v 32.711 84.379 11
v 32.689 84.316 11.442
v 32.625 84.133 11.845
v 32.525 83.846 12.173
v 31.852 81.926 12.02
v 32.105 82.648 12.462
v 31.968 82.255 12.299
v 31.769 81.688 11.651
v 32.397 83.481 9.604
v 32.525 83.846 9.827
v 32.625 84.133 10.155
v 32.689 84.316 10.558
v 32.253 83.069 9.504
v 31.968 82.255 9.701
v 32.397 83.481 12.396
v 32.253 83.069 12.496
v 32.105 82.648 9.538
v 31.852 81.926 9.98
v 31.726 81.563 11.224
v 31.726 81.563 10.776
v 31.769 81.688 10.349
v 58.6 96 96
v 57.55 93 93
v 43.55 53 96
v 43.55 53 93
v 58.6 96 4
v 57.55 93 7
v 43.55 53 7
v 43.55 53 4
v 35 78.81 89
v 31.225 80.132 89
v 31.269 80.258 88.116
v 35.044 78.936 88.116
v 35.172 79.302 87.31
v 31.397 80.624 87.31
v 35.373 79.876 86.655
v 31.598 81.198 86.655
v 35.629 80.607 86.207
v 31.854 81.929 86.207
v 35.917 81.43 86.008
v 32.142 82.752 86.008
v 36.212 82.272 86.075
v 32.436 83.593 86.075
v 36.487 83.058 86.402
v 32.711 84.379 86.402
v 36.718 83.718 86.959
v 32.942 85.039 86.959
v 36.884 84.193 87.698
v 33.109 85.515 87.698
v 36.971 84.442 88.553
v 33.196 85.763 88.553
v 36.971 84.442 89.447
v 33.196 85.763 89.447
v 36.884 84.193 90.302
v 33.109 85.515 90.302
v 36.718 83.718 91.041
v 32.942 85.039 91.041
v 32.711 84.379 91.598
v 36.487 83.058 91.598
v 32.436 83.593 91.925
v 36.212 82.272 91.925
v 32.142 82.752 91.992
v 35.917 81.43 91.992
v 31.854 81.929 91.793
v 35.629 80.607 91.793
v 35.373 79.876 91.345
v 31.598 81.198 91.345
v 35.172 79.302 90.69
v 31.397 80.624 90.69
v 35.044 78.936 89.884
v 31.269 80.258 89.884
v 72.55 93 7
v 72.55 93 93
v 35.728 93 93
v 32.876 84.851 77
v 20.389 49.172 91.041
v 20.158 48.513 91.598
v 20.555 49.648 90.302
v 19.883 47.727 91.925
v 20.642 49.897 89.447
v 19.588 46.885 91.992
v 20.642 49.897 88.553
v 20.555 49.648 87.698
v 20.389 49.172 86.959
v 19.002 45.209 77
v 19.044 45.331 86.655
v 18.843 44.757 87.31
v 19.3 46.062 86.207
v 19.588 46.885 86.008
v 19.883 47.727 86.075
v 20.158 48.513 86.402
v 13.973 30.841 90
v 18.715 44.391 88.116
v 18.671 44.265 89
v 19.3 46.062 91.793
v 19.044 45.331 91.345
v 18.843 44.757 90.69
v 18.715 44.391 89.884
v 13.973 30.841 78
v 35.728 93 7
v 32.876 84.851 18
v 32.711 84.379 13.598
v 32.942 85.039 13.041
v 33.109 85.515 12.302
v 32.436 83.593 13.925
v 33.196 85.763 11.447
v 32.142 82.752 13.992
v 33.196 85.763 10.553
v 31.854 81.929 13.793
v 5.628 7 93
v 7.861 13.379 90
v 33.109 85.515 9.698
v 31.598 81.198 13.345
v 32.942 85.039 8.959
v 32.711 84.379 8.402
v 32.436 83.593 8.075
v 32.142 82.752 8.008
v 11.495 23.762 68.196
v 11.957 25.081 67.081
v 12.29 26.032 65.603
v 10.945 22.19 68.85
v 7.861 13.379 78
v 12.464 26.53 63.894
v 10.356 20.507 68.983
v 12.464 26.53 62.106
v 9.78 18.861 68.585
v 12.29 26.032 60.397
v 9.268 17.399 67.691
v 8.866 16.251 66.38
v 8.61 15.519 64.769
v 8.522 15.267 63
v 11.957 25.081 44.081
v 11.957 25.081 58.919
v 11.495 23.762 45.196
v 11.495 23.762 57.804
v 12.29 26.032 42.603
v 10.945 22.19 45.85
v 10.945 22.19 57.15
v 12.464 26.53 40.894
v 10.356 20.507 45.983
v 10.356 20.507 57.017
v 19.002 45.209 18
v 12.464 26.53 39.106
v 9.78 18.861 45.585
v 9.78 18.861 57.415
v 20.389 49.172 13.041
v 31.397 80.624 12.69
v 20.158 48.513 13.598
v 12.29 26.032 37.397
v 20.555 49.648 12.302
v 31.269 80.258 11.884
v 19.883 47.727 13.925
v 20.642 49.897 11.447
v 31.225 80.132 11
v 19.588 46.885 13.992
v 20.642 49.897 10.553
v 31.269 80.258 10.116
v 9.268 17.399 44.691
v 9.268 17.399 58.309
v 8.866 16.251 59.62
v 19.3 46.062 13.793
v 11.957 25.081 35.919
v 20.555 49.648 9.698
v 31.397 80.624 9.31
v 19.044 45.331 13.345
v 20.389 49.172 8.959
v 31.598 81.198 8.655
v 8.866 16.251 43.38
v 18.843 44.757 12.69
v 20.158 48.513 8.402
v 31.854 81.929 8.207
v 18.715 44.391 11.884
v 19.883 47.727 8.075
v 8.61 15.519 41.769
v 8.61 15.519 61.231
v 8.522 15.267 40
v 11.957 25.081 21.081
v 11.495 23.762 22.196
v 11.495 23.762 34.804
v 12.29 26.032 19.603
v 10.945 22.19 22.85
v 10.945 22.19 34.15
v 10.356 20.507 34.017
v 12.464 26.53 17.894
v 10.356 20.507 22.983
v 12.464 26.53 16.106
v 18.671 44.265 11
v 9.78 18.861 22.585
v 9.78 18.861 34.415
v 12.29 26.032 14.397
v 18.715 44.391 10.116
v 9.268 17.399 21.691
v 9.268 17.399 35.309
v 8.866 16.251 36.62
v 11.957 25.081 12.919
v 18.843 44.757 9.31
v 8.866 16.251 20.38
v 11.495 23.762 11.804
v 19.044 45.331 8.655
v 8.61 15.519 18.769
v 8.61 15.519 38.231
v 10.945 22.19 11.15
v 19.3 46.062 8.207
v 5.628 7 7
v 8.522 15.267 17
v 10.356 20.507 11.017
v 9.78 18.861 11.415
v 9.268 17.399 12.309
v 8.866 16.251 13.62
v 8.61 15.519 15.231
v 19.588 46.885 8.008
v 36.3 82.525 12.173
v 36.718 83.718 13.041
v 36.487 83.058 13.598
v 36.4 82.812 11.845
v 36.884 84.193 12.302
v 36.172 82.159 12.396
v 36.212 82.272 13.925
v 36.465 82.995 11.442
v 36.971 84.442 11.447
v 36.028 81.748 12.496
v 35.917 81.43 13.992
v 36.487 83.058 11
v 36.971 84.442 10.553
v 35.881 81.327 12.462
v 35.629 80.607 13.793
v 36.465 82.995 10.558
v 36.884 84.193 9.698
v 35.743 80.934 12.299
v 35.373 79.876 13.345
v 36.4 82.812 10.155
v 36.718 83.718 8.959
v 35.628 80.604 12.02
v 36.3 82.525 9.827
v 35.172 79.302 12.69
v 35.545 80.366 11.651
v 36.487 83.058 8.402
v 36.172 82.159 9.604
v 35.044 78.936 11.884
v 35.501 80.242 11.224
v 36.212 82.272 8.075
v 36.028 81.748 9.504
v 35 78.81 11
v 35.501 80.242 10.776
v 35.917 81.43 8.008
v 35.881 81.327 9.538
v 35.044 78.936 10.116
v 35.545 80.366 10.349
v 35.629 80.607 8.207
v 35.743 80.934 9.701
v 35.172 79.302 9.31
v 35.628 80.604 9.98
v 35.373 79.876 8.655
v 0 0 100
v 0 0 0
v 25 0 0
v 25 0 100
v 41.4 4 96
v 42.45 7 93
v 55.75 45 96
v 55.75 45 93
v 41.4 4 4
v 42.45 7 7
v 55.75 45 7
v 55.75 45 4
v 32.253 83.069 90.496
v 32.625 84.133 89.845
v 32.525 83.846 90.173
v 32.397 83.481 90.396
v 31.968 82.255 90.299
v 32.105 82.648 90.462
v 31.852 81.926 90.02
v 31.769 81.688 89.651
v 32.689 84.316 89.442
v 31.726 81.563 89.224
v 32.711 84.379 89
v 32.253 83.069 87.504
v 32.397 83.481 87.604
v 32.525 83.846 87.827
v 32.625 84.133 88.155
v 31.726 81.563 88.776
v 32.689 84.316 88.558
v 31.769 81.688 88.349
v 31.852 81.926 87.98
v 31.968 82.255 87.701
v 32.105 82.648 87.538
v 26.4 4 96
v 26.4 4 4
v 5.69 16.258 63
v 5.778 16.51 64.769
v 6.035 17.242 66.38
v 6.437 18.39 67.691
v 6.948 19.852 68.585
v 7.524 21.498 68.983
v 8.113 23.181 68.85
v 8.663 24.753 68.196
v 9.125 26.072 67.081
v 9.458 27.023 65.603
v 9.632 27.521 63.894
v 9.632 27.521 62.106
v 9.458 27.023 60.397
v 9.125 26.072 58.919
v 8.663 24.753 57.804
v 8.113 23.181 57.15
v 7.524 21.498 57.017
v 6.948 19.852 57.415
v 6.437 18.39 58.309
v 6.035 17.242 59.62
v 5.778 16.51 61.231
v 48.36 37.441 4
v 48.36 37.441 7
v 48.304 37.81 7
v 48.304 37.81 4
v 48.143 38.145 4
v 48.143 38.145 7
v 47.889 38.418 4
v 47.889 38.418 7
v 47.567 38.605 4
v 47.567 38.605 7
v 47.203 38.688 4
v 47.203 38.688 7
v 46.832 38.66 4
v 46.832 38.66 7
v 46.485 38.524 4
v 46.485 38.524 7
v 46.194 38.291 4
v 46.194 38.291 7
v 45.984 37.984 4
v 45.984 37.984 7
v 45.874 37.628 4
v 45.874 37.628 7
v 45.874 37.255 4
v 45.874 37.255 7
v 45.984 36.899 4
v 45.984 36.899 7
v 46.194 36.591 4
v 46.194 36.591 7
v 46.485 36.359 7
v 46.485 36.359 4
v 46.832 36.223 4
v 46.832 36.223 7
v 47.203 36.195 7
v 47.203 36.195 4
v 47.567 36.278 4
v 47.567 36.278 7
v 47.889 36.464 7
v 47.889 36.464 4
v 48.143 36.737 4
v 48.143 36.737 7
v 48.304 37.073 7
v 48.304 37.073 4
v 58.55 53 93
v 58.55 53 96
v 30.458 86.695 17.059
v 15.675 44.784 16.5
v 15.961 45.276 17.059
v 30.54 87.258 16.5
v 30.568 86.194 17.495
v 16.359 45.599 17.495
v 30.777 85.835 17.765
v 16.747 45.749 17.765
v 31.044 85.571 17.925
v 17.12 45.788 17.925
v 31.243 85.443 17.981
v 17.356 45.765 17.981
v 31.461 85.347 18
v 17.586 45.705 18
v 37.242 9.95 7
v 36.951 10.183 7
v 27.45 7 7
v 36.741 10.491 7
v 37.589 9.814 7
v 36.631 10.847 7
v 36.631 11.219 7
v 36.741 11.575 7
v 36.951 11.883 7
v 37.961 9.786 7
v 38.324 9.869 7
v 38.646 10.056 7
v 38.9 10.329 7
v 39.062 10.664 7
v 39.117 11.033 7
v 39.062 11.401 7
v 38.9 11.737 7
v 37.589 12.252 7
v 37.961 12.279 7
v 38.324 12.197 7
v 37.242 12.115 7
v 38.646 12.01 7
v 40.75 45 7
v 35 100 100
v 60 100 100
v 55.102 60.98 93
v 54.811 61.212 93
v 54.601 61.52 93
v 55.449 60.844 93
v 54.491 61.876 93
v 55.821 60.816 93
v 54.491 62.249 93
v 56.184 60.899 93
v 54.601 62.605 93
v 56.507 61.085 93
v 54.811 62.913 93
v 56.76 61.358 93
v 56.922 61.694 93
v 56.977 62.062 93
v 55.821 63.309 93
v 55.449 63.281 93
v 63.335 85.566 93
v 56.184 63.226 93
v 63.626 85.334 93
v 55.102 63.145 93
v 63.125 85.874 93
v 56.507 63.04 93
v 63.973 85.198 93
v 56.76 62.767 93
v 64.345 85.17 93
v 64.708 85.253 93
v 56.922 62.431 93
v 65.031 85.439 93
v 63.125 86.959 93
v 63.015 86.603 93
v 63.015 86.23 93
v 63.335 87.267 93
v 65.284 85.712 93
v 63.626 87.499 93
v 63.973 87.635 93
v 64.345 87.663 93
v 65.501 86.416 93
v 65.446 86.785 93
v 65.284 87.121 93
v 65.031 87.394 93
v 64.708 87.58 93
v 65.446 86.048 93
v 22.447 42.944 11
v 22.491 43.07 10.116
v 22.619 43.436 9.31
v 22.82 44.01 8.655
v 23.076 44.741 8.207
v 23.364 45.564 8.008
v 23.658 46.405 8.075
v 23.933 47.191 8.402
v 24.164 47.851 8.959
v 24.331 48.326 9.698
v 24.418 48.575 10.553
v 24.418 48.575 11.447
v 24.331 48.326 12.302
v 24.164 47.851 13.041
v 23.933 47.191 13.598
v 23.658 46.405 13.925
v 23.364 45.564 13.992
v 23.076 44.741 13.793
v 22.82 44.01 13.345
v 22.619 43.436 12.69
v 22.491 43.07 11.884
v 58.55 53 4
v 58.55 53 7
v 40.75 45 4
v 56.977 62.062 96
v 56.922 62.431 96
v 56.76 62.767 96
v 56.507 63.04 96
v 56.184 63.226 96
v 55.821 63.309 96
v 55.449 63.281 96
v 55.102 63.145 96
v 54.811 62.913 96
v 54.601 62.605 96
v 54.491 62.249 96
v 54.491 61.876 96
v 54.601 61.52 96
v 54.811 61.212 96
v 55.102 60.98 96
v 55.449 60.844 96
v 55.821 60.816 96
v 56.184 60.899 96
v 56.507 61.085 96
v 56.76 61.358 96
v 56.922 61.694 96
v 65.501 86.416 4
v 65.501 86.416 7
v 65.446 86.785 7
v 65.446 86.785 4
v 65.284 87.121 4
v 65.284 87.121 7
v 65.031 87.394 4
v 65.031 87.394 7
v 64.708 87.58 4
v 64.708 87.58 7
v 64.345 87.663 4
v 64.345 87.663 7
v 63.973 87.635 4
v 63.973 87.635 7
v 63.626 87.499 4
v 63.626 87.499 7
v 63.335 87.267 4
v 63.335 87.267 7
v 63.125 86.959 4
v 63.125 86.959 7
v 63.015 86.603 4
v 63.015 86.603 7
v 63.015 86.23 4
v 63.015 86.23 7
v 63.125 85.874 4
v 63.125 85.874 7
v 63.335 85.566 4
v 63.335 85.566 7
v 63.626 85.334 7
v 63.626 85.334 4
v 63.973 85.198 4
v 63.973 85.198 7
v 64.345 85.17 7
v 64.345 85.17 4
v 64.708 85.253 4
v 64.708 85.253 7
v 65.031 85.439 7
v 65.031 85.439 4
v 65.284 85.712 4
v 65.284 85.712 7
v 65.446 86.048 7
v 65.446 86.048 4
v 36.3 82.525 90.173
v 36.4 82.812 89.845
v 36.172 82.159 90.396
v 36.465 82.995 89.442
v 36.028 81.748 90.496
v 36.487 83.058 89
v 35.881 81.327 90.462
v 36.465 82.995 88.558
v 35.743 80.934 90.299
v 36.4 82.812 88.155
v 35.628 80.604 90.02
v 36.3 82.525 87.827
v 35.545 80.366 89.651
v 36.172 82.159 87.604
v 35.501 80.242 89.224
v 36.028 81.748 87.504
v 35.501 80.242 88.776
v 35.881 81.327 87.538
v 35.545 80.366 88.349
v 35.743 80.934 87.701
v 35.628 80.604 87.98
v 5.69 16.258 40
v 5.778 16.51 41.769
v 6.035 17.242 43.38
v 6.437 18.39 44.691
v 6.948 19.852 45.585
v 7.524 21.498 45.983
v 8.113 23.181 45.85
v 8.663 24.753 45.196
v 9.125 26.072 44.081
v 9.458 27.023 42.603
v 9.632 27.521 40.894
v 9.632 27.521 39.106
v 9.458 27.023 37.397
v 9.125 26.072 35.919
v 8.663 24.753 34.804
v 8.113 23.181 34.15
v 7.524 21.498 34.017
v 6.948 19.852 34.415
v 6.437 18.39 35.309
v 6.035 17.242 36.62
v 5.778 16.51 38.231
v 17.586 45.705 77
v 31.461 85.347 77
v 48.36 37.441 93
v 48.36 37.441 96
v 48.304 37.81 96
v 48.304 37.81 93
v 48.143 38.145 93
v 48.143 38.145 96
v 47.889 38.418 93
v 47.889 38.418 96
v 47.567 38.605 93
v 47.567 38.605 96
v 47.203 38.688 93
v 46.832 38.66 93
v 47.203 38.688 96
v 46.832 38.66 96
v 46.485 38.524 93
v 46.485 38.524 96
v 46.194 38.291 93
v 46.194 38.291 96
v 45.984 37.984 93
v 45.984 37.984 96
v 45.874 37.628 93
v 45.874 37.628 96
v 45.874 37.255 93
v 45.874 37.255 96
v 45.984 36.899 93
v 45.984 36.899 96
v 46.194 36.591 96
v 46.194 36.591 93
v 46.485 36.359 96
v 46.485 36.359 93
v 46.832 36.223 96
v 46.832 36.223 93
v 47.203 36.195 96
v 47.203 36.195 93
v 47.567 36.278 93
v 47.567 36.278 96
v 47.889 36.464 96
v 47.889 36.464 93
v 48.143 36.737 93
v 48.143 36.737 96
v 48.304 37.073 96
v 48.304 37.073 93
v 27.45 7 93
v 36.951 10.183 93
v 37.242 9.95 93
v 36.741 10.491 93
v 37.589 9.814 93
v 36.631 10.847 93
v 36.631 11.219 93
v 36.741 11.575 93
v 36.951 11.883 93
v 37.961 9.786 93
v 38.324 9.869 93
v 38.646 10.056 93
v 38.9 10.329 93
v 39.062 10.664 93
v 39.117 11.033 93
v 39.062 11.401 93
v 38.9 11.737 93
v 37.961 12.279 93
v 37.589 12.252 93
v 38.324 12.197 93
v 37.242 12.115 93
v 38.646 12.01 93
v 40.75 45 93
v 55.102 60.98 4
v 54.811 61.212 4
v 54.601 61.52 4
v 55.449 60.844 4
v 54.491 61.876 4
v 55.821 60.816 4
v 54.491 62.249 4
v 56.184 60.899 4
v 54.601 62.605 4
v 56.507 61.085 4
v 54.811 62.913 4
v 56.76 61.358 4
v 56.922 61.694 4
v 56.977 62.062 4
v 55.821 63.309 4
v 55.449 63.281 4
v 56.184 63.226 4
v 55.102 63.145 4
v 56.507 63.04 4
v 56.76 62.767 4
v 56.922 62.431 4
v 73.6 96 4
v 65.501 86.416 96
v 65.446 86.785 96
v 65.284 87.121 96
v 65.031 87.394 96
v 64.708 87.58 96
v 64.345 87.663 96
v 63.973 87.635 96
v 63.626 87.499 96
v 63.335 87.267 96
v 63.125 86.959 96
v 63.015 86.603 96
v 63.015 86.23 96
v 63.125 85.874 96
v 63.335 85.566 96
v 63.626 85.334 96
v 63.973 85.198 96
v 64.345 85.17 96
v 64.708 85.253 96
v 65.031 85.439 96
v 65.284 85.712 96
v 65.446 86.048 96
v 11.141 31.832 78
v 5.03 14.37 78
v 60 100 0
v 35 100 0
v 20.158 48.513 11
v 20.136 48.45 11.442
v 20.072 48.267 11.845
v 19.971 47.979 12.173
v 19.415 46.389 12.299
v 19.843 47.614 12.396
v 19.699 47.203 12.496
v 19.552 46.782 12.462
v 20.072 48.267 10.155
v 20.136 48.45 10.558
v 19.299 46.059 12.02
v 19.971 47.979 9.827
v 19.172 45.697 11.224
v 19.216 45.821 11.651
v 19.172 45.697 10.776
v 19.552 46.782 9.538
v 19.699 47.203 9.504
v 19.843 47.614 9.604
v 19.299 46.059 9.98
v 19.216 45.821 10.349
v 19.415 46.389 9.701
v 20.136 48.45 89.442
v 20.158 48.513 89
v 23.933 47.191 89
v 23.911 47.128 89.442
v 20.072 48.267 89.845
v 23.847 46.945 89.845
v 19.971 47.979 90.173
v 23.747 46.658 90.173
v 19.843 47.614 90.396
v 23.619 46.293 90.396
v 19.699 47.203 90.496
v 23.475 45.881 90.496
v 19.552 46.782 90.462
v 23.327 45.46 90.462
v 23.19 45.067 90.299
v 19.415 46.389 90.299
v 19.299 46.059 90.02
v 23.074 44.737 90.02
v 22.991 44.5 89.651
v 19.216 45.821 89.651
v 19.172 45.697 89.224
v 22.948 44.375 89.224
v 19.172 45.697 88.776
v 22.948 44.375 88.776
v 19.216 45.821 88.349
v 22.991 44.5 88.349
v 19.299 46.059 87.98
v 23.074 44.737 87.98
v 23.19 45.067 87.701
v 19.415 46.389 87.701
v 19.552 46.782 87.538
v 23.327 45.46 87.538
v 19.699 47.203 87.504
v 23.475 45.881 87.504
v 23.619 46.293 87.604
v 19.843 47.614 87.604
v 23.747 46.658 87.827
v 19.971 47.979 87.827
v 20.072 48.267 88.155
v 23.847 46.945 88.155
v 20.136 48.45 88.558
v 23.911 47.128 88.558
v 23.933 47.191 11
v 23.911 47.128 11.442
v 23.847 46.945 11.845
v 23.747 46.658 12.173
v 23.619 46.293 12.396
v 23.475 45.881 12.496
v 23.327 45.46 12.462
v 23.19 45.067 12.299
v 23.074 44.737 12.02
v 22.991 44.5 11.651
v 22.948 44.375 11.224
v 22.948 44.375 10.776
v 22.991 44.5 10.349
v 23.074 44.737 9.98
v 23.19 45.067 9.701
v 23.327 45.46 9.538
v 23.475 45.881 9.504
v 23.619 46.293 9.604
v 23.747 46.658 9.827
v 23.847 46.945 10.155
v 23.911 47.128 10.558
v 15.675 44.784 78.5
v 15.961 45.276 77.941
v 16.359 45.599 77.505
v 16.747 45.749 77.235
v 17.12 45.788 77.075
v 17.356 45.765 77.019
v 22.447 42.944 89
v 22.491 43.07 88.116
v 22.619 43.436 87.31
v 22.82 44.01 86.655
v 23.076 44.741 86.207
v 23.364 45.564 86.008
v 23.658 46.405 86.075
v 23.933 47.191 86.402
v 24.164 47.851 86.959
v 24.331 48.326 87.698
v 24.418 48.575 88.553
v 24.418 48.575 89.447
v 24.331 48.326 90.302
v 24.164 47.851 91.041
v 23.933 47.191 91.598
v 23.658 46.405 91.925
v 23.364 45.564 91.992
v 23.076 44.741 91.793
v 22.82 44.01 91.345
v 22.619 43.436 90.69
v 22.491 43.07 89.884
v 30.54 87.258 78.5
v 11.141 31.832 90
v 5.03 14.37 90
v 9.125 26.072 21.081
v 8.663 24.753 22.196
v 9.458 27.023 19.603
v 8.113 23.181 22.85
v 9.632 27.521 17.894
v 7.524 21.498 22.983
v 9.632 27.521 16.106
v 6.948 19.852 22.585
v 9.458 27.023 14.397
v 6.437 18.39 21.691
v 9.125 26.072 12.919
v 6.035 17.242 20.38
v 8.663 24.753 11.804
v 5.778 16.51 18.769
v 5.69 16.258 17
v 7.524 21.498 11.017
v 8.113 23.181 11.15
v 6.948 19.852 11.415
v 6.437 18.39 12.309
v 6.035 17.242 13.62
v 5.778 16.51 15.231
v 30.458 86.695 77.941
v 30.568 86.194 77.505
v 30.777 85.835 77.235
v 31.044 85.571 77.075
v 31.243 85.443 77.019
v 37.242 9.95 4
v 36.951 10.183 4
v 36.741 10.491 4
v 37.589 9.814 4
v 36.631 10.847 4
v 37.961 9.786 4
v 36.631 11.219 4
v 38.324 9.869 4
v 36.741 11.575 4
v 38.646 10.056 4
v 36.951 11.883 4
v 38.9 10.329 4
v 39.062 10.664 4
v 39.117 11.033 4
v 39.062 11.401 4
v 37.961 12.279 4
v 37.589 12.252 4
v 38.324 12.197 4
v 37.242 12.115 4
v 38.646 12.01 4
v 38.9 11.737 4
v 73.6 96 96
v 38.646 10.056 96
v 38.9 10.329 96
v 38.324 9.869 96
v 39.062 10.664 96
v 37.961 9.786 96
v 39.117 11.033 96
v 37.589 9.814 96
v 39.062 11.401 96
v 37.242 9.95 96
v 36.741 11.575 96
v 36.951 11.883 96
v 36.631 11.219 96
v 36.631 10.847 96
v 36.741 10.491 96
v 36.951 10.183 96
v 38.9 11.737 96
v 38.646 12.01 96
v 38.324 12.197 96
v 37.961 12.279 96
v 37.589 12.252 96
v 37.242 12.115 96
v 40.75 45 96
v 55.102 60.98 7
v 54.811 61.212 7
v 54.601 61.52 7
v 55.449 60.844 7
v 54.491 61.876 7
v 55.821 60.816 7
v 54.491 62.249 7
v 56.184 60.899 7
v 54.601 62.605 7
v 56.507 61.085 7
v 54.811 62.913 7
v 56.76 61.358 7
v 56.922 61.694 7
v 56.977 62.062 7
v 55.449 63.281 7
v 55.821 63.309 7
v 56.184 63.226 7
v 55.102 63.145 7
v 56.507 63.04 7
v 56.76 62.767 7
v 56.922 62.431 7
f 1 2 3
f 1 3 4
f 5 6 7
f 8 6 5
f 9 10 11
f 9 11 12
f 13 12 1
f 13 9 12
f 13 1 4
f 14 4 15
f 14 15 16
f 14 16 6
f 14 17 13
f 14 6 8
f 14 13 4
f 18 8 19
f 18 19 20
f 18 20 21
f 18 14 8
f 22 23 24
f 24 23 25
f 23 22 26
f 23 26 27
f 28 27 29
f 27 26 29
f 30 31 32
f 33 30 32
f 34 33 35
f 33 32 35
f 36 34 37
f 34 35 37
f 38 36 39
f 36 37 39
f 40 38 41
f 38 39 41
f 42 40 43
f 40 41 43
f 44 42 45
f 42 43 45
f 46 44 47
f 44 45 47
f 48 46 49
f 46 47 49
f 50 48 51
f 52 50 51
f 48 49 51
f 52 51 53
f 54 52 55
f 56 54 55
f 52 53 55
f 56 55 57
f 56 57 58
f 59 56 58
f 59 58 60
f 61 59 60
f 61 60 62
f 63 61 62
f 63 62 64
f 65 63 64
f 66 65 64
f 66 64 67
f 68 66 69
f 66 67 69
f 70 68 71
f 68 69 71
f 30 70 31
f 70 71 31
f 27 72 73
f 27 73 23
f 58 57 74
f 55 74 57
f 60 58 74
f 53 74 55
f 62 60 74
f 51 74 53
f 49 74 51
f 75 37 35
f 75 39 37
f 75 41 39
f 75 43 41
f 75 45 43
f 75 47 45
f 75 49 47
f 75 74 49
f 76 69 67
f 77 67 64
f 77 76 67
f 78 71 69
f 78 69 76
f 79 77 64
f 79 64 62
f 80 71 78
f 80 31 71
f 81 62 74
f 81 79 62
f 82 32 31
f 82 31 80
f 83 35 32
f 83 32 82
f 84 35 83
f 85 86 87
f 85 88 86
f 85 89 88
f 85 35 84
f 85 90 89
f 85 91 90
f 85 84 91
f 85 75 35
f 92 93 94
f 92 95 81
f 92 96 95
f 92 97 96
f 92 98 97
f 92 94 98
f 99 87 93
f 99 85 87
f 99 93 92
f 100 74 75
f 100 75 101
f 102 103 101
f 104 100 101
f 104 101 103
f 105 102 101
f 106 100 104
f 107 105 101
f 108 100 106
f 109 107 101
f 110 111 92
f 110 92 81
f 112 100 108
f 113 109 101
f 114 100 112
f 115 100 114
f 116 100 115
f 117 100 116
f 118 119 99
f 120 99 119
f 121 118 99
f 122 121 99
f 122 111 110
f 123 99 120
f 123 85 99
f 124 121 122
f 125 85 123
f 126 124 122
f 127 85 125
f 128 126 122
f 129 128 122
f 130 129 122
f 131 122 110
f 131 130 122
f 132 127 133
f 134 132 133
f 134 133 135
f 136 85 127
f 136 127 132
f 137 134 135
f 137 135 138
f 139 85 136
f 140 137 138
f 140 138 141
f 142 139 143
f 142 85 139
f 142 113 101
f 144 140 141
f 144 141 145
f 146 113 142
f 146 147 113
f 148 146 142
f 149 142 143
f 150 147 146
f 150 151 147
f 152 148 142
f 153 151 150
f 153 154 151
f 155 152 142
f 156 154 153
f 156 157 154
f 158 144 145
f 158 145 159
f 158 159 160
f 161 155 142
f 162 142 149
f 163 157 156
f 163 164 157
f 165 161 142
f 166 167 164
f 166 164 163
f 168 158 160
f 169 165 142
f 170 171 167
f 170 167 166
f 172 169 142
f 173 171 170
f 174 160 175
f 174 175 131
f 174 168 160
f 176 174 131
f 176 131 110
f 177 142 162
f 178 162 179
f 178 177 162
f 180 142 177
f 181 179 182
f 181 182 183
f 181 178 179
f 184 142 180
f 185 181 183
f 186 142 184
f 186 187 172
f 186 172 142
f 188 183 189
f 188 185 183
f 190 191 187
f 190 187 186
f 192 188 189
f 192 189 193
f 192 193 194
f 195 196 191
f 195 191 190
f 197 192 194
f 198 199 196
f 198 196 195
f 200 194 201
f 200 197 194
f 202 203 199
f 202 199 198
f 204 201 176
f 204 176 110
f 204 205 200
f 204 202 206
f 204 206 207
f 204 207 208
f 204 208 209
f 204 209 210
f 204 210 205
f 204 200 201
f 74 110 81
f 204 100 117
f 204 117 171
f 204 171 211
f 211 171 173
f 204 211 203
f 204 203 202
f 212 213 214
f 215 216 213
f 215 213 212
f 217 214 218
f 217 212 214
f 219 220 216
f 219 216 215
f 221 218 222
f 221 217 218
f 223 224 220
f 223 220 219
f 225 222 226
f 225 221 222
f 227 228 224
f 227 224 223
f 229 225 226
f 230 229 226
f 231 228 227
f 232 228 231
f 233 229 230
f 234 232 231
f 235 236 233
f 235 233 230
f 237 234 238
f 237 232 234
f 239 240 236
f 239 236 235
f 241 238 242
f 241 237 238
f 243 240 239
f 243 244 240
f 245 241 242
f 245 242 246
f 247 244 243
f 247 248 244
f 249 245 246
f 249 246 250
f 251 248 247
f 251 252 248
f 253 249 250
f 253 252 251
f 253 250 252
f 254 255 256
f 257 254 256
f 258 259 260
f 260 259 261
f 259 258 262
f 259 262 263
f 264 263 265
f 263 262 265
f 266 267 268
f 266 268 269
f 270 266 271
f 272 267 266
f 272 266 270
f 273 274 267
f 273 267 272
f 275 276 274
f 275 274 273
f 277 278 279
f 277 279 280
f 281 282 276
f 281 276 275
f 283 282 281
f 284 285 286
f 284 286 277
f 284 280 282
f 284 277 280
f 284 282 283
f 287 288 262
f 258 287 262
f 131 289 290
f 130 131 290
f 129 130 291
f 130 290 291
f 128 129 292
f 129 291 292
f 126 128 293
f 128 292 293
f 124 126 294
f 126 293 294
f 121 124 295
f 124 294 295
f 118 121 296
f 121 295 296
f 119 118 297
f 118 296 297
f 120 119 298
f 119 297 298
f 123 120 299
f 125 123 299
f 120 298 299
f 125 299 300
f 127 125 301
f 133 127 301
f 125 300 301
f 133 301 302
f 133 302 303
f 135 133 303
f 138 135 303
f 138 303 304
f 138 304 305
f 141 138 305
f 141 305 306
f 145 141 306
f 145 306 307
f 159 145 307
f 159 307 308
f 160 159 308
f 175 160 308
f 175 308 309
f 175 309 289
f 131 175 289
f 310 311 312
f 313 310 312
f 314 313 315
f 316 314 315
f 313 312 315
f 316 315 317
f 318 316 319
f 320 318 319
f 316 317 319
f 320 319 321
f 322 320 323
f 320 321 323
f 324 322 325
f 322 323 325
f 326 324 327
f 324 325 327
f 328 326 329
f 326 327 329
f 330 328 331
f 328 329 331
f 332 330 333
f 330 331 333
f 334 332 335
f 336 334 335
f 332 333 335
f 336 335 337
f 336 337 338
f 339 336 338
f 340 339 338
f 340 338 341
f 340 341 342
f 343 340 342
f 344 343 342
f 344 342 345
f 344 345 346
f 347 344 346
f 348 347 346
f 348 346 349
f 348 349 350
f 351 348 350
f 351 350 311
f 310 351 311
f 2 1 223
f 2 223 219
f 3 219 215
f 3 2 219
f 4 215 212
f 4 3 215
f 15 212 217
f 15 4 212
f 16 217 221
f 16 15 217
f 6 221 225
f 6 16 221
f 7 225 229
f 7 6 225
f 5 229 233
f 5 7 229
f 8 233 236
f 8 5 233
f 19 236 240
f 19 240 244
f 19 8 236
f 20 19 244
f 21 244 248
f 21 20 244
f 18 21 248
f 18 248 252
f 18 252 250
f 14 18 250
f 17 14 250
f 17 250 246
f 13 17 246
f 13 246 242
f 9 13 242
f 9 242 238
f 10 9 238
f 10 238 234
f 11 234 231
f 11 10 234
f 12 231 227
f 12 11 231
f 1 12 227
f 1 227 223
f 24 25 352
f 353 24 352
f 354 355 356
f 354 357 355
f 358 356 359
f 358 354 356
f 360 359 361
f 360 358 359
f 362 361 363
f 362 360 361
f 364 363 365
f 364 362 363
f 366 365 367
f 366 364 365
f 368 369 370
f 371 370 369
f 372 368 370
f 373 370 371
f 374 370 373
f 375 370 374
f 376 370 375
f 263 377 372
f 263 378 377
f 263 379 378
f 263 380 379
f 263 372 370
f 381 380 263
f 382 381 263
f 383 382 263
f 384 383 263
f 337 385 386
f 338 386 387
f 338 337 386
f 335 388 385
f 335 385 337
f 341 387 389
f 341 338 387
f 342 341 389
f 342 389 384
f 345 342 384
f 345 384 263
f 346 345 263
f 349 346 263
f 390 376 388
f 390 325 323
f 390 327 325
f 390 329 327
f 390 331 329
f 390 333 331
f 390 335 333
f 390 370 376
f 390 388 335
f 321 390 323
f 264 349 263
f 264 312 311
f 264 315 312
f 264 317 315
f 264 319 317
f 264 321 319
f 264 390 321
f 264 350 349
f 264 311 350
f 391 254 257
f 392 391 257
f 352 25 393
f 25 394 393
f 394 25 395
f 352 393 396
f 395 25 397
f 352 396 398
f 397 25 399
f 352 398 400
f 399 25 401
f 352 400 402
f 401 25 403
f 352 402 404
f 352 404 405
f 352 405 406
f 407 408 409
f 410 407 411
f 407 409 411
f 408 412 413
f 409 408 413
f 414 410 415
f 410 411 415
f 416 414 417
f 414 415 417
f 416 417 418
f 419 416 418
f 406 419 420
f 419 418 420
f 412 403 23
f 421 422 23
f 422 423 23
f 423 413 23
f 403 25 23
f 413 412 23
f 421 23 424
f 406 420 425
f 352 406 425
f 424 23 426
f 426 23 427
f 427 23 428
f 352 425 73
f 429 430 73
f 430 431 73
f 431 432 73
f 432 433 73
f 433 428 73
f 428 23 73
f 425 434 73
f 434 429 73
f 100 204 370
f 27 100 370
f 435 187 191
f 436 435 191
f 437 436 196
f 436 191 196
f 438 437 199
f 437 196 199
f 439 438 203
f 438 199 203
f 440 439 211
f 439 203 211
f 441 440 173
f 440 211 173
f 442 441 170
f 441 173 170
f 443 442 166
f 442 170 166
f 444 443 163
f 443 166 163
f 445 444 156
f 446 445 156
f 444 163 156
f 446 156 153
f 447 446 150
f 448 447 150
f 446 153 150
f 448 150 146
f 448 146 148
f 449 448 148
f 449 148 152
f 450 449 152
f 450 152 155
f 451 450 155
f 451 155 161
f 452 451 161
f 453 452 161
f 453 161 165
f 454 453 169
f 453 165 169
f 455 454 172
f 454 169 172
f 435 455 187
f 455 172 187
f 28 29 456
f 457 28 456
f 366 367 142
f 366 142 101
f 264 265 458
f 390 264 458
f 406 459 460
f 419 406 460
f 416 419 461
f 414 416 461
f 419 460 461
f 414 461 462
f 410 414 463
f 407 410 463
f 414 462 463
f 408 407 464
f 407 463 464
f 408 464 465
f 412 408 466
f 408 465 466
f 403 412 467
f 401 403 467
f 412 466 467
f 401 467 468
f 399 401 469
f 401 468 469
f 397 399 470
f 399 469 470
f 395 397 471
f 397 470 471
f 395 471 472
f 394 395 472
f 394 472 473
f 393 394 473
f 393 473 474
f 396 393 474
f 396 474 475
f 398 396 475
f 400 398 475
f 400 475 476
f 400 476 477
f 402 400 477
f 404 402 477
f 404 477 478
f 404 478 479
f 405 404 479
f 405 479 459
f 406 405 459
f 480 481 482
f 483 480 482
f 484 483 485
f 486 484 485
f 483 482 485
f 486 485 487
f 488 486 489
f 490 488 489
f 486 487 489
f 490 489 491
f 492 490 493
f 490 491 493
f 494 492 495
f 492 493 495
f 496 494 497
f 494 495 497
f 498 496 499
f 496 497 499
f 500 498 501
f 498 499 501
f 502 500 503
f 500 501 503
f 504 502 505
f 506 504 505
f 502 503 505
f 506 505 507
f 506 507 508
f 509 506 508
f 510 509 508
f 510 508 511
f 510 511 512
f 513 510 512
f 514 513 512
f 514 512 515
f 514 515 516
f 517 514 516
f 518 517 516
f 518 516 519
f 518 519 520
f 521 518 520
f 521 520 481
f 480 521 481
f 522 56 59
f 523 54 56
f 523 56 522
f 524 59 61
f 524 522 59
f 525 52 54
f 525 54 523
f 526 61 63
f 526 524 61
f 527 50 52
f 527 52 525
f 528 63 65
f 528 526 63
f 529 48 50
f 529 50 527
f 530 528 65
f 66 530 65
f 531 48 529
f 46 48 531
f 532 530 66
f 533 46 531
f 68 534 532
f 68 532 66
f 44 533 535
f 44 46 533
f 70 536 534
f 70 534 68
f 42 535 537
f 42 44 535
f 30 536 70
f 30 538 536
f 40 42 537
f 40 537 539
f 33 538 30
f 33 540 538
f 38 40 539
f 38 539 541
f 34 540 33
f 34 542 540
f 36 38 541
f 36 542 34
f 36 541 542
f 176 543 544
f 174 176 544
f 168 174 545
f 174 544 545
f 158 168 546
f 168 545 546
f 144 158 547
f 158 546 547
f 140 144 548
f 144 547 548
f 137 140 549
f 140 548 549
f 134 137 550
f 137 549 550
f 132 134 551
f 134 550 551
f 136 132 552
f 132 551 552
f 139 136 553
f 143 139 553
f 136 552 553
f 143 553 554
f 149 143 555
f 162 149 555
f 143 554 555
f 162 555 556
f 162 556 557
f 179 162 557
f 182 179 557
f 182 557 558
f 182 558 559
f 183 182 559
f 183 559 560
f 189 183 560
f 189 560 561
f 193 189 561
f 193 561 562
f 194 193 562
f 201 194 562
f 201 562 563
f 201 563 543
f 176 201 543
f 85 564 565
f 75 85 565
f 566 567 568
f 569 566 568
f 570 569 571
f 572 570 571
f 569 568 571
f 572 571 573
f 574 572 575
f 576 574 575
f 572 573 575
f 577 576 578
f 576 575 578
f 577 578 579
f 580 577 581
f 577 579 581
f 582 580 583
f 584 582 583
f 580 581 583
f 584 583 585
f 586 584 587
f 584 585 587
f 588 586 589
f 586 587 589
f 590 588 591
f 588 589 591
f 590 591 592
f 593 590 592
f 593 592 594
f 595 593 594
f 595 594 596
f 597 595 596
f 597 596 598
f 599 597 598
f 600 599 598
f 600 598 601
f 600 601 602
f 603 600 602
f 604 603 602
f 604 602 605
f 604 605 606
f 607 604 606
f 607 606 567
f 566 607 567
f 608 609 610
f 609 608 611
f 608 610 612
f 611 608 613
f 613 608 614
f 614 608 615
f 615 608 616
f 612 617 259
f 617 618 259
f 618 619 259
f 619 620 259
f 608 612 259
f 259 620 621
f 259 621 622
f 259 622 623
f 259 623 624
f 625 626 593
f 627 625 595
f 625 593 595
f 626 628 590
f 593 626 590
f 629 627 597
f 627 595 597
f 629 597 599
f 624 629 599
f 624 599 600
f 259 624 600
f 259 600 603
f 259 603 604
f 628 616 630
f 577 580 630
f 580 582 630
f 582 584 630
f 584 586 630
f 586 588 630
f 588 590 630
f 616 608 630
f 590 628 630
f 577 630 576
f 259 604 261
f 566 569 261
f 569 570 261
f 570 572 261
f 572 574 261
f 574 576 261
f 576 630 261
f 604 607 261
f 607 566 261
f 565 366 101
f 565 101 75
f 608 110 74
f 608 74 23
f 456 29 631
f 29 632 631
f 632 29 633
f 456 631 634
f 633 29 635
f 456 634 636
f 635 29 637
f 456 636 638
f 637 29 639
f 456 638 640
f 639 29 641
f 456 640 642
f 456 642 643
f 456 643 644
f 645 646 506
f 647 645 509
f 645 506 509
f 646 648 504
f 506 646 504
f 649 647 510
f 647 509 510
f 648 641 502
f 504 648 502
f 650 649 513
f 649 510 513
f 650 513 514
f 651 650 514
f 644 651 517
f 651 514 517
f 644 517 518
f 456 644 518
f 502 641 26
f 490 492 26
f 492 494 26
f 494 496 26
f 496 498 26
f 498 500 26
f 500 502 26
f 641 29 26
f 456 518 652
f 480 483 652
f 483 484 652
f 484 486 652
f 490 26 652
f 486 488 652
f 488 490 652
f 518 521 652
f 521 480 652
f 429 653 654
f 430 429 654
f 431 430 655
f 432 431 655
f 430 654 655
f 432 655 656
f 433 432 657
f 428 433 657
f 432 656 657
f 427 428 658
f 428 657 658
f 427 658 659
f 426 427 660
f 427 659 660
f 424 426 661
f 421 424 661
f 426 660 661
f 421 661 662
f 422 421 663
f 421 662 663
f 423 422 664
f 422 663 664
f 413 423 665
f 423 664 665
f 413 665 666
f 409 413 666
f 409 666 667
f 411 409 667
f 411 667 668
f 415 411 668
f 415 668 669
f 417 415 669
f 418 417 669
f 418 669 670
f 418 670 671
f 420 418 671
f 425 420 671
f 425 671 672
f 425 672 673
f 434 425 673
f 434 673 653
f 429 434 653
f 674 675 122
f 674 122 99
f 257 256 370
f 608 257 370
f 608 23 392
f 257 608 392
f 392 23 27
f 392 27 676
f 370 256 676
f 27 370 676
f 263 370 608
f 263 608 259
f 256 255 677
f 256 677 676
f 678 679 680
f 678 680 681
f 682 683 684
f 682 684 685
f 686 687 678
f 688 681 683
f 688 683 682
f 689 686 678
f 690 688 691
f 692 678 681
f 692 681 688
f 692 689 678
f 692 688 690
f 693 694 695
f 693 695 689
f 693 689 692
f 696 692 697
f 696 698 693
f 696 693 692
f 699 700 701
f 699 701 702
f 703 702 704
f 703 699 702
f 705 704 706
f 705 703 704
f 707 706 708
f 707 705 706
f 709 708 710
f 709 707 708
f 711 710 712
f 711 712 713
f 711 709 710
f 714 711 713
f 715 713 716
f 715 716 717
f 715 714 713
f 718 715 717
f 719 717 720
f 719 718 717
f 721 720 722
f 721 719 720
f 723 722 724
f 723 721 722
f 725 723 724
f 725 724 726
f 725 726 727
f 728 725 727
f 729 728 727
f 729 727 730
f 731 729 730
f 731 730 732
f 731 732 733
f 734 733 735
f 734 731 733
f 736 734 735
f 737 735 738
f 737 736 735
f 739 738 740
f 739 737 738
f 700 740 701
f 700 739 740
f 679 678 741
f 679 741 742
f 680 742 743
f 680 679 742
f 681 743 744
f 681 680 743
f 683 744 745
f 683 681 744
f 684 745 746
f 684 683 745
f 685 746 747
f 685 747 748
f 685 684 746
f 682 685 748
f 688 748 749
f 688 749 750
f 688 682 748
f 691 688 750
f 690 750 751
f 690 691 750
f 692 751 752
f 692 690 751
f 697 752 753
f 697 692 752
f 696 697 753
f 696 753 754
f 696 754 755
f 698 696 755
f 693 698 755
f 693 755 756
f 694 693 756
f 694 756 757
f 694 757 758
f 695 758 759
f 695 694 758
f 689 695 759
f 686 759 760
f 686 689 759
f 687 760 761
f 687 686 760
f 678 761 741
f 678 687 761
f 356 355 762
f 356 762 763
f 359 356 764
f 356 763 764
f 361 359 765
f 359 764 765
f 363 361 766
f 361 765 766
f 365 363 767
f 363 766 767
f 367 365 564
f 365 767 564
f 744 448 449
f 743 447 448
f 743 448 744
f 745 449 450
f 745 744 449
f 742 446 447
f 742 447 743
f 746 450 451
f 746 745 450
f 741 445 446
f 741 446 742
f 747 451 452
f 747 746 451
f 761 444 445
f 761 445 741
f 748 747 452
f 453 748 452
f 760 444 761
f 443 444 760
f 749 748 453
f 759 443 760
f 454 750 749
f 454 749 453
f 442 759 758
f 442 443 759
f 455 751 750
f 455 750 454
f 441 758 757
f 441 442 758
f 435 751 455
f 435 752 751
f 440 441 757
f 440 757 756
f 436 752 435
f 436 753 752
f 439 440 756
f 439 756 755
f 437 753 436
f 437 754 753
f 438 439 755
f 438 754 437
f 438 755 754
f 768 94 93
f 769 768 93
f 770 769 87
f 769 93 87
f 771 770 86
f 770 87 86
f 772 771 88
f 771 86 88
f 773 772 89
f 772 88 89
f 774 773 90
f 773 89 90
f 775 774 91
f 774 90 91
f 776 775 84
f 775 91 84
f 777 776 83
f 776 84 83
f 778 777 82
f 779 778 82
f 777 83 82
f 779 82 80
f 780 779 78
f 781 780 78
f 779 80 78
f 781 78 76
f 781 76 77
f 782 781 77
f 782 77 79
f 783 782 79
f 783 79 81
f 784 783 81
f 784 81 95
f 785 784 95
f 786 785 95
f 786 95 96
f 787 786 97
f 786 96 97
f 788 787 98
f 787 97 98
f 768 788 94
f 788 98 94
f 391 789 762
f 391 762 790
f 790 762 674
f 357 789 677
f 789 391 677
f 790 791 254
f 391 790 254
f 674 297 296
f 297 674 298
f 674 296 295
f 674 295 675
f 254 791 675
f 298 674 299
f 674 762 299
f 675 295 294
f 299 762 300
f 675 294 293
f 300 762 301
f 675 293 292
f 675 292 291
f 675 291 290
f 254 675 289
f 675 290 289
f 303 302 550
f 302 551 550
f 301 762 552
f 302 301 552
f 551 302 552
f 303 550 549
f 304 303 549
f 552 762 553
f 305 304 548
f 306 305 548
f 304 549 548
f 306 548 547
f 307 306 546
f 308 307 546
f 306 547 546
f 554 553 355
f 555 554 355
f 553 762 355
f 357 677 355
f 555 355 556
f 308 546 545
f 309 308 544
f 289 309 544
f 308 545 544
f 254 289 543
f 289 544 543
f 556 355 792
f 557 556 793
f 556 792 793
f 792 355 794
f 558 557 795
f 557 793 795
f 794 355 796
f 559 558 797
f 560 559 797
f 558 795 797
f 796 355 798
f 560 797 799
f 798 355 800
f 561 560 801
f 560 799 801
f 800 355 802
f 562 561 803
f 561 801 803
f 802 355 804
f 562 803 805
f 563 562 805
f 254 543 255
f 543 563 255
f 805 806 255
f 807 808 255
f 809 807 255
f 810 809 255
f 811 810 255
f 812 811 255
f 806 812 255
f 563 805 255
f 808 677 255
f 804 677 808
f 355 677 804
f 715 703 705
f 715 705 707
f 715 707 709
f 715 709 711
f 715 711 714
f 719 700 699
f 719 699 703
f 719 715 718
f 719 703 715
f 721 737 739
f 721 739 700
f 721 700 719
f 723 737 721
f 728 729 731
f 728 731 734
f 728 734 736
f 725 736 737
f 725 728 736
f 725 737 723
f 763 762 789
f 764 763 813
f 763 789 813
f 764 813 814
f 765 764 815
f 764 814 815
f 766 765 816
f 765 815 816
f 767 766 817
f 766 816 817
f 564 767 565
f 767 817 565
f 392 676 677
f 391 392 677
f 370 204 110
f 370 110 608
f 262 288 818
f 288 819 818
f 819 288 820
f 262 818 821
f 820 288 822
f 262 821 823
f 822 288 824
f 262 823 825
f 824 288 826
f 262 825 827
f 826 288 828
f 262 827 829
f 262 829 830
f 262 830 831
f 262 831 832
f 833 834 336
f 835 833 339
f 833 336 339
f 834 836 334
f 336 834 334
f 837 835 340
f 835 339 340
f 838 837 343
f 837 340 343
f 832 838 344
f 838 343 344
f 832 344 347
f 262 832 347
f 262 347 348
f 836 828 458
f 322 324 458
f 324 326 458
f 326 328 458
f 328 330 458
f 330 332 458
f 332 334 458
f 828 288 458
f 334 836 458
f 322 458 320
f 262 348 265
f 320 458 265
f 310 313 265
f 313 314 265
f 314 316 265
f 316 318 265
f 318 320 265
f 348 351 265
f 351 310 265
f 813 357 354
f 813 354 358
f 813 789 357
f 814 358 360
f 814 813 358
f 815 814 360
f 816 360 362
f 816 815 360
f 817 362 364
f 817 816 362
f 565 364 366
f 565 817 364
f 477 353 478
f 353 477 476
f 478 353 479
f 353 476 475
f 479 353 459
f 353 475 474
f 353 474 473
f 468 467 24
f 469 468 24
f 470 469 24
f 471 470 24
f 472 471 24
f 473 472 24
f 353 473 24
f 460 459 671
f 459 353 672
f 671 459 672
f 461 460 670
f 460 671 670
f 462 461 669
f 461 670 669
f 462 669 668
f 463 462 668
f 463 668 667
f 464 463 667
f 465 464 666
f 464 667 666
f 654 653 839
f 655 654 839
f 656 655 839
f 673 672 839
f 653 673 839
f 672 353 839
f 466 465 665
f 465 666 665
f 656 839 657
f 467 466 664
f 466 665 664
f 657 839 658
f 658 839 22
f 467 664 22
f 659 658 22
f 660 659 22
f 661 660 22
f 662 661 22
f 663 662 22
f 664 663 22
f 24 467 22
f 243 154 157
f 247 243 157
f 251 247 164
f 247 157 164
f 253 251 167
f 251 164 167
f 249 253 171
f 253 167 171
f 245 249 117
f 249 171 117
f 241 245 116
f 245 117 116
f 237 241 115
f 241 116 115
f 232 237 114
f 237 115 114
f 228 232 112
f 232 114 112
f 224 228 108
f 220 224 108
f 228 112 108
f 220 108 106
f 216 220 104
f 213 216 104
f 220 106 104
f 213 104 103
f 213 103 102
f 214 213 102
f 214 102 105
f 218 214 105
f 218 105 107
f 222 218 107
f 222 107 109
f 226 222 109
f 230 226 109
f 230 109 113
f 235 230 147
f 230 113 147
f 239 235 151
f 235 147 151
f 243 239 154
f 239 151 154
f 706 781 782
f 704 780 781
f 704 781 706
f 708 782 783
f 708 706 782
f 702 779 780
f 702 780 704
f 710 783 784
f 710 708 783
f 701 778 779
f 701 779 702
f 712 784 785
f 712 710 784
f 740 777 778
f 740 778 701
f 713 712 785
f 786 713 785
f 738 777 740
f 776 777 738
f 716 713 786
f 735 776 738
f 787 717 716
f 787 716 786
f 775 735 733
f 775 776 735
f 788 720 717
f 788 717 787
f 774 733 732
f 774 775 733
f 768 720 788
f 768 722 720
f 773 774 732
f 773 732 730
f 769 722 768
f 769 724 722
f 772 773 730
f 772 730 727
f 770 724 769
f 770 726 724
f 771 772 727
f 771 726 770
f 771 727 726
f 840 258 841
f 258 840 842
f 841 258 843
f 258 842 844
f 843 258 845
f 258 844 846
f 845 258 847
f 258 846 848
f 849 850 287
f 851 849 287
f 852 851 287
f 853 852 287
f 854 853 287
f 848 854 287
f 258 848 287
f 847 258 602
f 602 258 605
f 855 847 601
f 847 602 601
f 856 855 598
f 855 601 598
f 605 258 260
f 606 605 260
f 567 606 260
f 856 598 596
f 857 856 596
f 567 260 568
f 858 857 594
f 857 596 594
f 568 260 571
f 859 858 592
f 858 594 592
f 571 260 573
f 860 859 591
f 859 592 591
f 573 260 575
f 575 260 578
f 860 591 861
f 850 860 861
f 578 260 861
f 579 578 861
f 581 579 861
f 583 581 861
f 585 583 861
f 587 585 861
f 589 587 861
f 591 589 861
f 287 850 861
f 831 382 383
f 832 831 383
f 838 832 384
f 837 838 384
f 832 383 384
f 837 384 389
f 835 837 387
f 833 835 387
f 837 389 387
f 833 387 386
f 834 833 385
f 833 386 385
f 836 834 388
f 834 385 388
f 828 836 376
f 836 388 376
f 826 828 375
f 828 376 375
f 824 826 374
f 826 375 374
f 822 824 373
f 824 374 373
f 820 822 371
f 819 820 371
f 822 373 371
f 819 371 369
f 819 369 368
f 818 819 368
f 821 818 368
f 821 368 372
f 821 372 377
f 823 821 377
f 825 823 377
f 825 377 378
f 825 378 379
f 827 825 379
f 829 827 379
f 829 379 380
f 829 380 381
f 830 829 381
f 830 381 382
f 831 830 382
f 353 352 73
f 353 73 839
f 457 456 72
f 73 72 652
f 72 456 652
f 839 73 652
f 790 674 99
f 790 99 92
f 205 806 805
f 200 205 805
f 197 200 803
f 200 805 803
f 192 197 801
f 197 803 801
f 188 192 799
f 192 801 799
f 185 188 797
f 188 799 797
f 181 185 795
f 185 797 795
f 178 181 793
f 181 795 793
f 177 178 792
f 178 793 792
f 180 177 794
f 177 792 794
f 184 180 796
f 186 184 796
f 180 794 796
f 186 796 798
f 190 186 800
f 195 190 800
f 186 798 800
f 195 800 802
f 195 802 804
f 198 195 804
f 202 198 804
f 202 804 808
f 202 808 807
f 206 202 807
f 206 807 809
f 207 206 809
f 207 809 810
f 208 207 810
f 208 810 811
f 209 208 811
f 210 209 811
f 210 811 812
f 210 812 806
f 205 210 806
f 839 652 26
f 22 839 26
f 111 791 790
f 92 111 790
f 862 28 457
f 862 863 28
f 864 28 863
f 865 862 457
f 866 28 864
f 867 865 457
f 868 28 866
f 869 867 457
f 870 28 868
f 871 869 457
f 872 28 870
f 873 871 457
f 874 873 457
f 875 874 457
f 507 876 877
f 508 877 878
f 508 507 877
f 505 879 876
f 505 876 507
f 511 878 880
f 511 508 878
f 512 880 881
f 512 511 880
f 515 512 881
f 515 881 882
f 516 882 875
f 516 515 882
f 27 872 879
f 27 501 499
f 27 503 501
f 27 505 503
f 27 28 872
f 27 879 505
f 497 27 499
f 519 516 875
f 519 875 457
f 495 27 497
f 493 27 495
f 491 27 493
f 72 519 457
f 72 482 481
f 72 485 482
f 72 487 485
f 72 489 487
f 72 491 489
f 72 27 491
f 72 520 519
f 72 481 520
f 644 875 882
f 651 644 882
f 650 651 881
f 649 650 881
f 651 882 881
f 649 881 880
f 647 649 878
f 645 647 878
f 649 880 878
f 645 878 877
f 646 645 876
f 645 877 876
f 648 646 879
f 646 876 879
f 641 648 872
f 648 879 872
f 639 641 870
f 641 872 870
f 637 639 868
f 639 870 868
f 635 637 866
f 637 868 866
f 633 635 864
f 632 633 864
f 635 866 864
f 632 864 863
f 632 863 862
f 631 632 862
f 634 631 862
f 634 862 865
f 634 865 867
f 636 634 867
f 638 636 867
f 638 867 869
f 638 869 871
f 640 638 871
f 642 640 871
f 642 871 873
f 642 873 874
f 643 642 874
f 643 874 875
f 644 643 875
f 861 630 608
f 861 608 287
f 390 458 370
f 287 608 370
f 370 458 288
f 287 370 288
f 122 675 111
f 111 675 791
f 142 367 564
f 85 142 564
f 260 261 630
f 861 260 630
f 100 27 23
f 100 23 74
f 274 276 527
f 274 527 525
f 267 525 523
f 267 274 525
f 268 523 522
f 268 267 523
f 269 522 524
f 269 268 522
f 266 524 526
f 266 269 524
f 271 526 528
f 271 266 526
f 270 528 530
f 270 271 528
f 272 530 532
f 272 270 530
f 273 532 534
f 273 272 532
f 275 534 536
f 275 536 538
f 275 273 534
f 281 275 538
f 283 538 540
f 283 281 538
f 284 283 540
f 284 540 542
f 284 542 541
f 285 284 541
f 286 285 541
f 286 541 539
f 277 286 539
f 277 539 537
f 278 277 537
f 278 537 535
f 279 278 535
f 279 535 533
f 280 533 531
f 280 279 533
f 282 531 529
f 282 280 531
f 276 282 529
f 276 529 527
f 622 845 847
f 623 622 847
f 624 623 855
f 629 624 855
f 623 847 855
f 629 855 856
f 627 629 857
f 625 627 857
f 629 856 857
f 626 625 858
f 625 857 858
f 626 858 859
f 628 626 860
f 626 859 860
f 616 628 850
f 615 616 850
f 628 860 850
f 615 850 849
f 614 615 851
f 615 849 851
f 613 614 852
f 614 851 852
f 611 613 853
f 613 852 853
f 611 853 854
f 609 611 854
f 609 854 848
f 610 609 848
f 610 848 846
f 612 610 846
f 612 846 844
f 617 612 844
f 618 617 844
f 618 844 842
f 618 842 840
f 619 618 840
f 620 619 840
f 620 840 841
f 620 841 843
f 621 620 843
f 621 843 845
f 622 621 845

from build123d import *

# Parameters (mm, degrees)
DODANIE_WYCI_GNI_CIE1_DEPTH    = 100
DODANIE_WYCI_GNI_CIE2_START    = -96
DODANIE_WYCI_GNI_CIE2_DEPTH    = 96.000012
SZKIC3_R                       = 1.25
WYTNIJ_WYCI_GNI_CIE2_DEPTH     = 100
WYTNIJ_WYCI_GNI_CIE3_DEPTH     = 4
WYTNIJ_WYCI_GNI_CIE4_START     = 7
WYTNIJ_WYCI_GNI_CIE4_OUTLINE_R = 1.25
WYTNIJ_WYCI_GNI_CIE4_DEPTH     = 86.000012
SZKIC9_W                       = 59
SZKIC9_H                       = 42
SZKIC9_W_2                     = 12
SZKIC9_H_2                     = 18.5
WYTNIJ_WYCI_GNI_CIE5_DEPTH     = 3
SZKIC10_R                      = 3
SZKIC10_R_2                    = 1.5
DODANIE_WYCI_GNI_CIE3_DEPTH    = 4
SZKIC13_R                      = 6
WYTNIJ_WYCI_GNI_CIE6_DEPTH     = 4
ZAOKR_GLENIE1_R                = 1.5


# Read off the part's stored shape, not the designer's step: Dodanie-wyciągnięcie2, Wytnij-wyciągnięcie4
with BuildPart() as part:
    # Szkic1 → Dodanie-wyciągnięcie1 (new body)
    with BuildSketch(Plane.XY):
        Polygon((0, 0), (25, 0), (60, 100), (35, 100), align=None)
    extrude(amount=DODANIE_WYCI_GNI_CIE1_DEPTH)


with BuildPart() as body_2:
    # Dodanie-wyciągnięcie2 outline → Dodanie-wyciągnięcie2 (new body)
    with BuildSketch(Plane.XY.offset(100).offset(DODANIE_WYCI_GNI_CIE2_START)):
        Polygon((73.6, 96), (58.6, 96), (43.55, 53), (58.55, 53), align=None)
        Polygon((55.75, 45), (40.75, 45), (26.4, 4), (41.4, 4), align=None)
    extrude(amount=DODANIE_WYCI_GNI_CIE2_DEPTH)

    # Szkic3 → Wytnij-wyciągnięcie2 (cut)
    with BuildSketch(Plane.XY.offset(100.000012)):
        with Locations((64.251332646, 86.416411722)):
            Circle(SZKIC3_R)
        with Locations((55.727425581, 62.062391537)):
            Circle(SZKIC3_R)
        with Locations((47.110009053, 37.441201457)):
            Circle(SZKIC3_R)
        with Locations((37.867118116, 11.032941637)):
            Circle(SZKIC3_R)
    extrude(amount=-WYTNIJ_WYCI_GNI_CIE2_DEPTH, mode=Mode.SUBTRACT)

    # Szkic4 → Wytnij-wyciągnięcie3 (cut)
    with BuildSketch(Plane.XY.offset(100.000012)):
        Polygon((26.4, 4), (58.6, 96), (73.6, 96), (41.4, 4), align=None)
    extrude(amount=-WYTNIJ_WYCI_GNI_CIE3_DEPTH, mode=Mode.SUBTRACT)


with BuildPart() as wytnij_wyci_gni_cie4_tool:
    # Wytnij-wyciągnięcie4 outline → Wytnij-wyciągnięcie4 (new body)
    with BuildSketch(Plane.XY.offset(WYTNIJ_WYCI_GNI_CIE4_START)):
        Polygon((40.75, 45), (43.55, 53), (58.55, 53), (72.55, 93), (35.728443015, 93), (5.628443015, 7), (42.45, 7), (55.75, 45), align=None)
        with Locations((64.251332646, 86.416411722)):
            Circle(WYTNIJ_WYCI_GNI_CIE4_OUTLINE_R, mode=Mode.SUBTRACT)
        with Locations((55.727425581, 62.062391537)):
            Circle(WYTNIJ_WYCI_GNI_CIE4_OUTLINE_R, mode=Mode.SUBTRACT)
        with Locations((47.110009053, 37.441201457)):
            Circle(WYTNIJ_WYCI_GNI_CIE4_OUTLINE_R, mode=Mode.SUBTRACT)
        with Locations((37.867118116, 11.032941637)):
            Circle(WYTNIJ_WYCI_GNI_CIE4_OUTLINE_R, mode=Mode.SUBTRACT)
    extrude(amount=WYTNIJ_WYCI_GNI_CIE4_DEPTH)


with BuildPart() as part_1:
    add(part.part)

    # Wytnij-wyciągnięcie4: cut by wytnij_wyci_gni_cie4_tool
    add(wytnij_wyci_gni_cie4_tool.part, mode=Mode.SUBTRACT)

    # Szkic9 → Wytnij-wyciągnięcie5 (cut)
    with BuildSketch(Plane(origin=(0, 0, 0), x_dir=(0, 0, 1), z_dir=(-0.9438583563660174, 0.33035042472810605, 0))):
        with Locations((47.5, 69.948100502)):
            Rectangle(SZKIC9_W, SZKIC9_H)
        with Locations((84, 24.475)):
            Rectangle(SZKIC9_W_2, SZKIC9_H_2)
    extrude(amount=-WYTNIJ_WYCI_GNI_CIE5_DEPTH, mode=Mode.SUBTRACT)

    # Szkic10 → Dodanie-wyciągnięcie3 (add)
    # profile 1 of 4: a face of its own
    with BuildSketch(Plane(origin=(2.831575069, -0.991051274, 0), x_dir=(0, 0, -1), z_dir=(0.9438583563660174, -0.33035042472810605, 0))):
        with Locations(Location((-89, 88.948100502, 0), (0, 0, 270))):
            Circle(SZKIC10_R)
        with Locations(Location((-89, 88.948100502, 0), (0, 0, 90))):
            Circle(SZKIC10_R_2, mode=Mode.SUBTRACT)
    # profile 2 of 4: a face of its own
    with BuildSketch(Plane(origin=(2.831575069, -0.991051274, 0), x_dir=(0, 0, -1), z_dir=(0.9438583563660174, -0.33035042472810605, 0))):
        with Locations(Location((-89, 50.948100502, 0), (0, 0, 270))):
            Circle(SZKIC10_R)
        with Locations(Location((-89, 50.948100502, 0), (0, 0, 90))):
            Circle(SZKIC10_R_2, mode=Mode.SUBTRACT)
    # profile 3 of 4: a face of its own
    with BuildSketch(Plane(origin=(2.831575069, -0.991051274, 0), x_dir=(0, 0, -1), z_dir=(0.9438583563660174, -0.33035042472810605, 0))):
        with Locations(Location((-11, 50.948100502, 0), (0, 0, 270))):
            Circle(SZKIC10_R)
        with Locations(Location((-11, 50.948100502, 0), (0, 0, 90))):
            Circle(SZKIC10_R_2, mode=Mode.SUBTRACT)
    # profile 4 of 4: a face of its own
    with BuildSketch(Plane(origin=(2.831575069, -0.991051274, 0), x_dir=(0, 0, -1), z_dir=(0.9438583563660174, -0.33035042472810605, 0))):
        with Locations(Location((-11, 88.948100502, 0), (0, 0, 270))):
            Circle(SZKIC10_R)
        with Locations(Location((-11, 88.948100502, 0), (0, 0, 90))):
            Circle(SZKIC10_R_2, mode=Mode.SUBTRACT)
    extrude(amount=DODANIE_WYCI_GNI_CIE3_DEPTH)

    # Szkic13 → Wytnij-wyciągnięcie6 (cut)
    with BuildSketch(Plane(origin=(0, 0, 0), x_dir=(0, 0, 1), z_dir=(-0.9438583563660174, 0.33035042472810605, 0))):
        with Locations(Location((17, 23.225, 0), (0, 0, 270))):
            Circle(SZKIC13_R)
        with Locations(Location((40, 23.225, 0), (0, 0, 270))):
            Circle(SZKIC13_R)
        with Locations(Location((63, 23.225, 0), (0, 0, 270))):
            Circle(SZKIC13_R)
    extrude(amount=-WYTNIJ_WYCI_GNI_CIE6_DEPTH, mode=Mode.SUBTRACT)

    # Zaokrąglenie1
    zaokr_glenie1_edges = [part_1.edges().sort_by_distance(p)[0] for p in [
        (23.10738471, 66.021099171, 18),
        (16.17002579, 46.200073687, 47.5),
        (23.10738471, 66.021099171, 77),
        (30.044743629, 85.842124655, 47.5),
    ]]
    fillet(zaokr_glenie1_edges, radius=ZAOKR_GLENIE1_R)


with BuildPart() as body_2_1:
    add(body_2.part)

    # Wytnij-wyciągnięcie4: cut by wytnij_wyci_gni_cie4_tool
    add(wytnij_wyci_gni_cie4_tool.part, mode=Mode.SUBTRACT)


solid = Compound([part_1.part, body_2_1.part])
